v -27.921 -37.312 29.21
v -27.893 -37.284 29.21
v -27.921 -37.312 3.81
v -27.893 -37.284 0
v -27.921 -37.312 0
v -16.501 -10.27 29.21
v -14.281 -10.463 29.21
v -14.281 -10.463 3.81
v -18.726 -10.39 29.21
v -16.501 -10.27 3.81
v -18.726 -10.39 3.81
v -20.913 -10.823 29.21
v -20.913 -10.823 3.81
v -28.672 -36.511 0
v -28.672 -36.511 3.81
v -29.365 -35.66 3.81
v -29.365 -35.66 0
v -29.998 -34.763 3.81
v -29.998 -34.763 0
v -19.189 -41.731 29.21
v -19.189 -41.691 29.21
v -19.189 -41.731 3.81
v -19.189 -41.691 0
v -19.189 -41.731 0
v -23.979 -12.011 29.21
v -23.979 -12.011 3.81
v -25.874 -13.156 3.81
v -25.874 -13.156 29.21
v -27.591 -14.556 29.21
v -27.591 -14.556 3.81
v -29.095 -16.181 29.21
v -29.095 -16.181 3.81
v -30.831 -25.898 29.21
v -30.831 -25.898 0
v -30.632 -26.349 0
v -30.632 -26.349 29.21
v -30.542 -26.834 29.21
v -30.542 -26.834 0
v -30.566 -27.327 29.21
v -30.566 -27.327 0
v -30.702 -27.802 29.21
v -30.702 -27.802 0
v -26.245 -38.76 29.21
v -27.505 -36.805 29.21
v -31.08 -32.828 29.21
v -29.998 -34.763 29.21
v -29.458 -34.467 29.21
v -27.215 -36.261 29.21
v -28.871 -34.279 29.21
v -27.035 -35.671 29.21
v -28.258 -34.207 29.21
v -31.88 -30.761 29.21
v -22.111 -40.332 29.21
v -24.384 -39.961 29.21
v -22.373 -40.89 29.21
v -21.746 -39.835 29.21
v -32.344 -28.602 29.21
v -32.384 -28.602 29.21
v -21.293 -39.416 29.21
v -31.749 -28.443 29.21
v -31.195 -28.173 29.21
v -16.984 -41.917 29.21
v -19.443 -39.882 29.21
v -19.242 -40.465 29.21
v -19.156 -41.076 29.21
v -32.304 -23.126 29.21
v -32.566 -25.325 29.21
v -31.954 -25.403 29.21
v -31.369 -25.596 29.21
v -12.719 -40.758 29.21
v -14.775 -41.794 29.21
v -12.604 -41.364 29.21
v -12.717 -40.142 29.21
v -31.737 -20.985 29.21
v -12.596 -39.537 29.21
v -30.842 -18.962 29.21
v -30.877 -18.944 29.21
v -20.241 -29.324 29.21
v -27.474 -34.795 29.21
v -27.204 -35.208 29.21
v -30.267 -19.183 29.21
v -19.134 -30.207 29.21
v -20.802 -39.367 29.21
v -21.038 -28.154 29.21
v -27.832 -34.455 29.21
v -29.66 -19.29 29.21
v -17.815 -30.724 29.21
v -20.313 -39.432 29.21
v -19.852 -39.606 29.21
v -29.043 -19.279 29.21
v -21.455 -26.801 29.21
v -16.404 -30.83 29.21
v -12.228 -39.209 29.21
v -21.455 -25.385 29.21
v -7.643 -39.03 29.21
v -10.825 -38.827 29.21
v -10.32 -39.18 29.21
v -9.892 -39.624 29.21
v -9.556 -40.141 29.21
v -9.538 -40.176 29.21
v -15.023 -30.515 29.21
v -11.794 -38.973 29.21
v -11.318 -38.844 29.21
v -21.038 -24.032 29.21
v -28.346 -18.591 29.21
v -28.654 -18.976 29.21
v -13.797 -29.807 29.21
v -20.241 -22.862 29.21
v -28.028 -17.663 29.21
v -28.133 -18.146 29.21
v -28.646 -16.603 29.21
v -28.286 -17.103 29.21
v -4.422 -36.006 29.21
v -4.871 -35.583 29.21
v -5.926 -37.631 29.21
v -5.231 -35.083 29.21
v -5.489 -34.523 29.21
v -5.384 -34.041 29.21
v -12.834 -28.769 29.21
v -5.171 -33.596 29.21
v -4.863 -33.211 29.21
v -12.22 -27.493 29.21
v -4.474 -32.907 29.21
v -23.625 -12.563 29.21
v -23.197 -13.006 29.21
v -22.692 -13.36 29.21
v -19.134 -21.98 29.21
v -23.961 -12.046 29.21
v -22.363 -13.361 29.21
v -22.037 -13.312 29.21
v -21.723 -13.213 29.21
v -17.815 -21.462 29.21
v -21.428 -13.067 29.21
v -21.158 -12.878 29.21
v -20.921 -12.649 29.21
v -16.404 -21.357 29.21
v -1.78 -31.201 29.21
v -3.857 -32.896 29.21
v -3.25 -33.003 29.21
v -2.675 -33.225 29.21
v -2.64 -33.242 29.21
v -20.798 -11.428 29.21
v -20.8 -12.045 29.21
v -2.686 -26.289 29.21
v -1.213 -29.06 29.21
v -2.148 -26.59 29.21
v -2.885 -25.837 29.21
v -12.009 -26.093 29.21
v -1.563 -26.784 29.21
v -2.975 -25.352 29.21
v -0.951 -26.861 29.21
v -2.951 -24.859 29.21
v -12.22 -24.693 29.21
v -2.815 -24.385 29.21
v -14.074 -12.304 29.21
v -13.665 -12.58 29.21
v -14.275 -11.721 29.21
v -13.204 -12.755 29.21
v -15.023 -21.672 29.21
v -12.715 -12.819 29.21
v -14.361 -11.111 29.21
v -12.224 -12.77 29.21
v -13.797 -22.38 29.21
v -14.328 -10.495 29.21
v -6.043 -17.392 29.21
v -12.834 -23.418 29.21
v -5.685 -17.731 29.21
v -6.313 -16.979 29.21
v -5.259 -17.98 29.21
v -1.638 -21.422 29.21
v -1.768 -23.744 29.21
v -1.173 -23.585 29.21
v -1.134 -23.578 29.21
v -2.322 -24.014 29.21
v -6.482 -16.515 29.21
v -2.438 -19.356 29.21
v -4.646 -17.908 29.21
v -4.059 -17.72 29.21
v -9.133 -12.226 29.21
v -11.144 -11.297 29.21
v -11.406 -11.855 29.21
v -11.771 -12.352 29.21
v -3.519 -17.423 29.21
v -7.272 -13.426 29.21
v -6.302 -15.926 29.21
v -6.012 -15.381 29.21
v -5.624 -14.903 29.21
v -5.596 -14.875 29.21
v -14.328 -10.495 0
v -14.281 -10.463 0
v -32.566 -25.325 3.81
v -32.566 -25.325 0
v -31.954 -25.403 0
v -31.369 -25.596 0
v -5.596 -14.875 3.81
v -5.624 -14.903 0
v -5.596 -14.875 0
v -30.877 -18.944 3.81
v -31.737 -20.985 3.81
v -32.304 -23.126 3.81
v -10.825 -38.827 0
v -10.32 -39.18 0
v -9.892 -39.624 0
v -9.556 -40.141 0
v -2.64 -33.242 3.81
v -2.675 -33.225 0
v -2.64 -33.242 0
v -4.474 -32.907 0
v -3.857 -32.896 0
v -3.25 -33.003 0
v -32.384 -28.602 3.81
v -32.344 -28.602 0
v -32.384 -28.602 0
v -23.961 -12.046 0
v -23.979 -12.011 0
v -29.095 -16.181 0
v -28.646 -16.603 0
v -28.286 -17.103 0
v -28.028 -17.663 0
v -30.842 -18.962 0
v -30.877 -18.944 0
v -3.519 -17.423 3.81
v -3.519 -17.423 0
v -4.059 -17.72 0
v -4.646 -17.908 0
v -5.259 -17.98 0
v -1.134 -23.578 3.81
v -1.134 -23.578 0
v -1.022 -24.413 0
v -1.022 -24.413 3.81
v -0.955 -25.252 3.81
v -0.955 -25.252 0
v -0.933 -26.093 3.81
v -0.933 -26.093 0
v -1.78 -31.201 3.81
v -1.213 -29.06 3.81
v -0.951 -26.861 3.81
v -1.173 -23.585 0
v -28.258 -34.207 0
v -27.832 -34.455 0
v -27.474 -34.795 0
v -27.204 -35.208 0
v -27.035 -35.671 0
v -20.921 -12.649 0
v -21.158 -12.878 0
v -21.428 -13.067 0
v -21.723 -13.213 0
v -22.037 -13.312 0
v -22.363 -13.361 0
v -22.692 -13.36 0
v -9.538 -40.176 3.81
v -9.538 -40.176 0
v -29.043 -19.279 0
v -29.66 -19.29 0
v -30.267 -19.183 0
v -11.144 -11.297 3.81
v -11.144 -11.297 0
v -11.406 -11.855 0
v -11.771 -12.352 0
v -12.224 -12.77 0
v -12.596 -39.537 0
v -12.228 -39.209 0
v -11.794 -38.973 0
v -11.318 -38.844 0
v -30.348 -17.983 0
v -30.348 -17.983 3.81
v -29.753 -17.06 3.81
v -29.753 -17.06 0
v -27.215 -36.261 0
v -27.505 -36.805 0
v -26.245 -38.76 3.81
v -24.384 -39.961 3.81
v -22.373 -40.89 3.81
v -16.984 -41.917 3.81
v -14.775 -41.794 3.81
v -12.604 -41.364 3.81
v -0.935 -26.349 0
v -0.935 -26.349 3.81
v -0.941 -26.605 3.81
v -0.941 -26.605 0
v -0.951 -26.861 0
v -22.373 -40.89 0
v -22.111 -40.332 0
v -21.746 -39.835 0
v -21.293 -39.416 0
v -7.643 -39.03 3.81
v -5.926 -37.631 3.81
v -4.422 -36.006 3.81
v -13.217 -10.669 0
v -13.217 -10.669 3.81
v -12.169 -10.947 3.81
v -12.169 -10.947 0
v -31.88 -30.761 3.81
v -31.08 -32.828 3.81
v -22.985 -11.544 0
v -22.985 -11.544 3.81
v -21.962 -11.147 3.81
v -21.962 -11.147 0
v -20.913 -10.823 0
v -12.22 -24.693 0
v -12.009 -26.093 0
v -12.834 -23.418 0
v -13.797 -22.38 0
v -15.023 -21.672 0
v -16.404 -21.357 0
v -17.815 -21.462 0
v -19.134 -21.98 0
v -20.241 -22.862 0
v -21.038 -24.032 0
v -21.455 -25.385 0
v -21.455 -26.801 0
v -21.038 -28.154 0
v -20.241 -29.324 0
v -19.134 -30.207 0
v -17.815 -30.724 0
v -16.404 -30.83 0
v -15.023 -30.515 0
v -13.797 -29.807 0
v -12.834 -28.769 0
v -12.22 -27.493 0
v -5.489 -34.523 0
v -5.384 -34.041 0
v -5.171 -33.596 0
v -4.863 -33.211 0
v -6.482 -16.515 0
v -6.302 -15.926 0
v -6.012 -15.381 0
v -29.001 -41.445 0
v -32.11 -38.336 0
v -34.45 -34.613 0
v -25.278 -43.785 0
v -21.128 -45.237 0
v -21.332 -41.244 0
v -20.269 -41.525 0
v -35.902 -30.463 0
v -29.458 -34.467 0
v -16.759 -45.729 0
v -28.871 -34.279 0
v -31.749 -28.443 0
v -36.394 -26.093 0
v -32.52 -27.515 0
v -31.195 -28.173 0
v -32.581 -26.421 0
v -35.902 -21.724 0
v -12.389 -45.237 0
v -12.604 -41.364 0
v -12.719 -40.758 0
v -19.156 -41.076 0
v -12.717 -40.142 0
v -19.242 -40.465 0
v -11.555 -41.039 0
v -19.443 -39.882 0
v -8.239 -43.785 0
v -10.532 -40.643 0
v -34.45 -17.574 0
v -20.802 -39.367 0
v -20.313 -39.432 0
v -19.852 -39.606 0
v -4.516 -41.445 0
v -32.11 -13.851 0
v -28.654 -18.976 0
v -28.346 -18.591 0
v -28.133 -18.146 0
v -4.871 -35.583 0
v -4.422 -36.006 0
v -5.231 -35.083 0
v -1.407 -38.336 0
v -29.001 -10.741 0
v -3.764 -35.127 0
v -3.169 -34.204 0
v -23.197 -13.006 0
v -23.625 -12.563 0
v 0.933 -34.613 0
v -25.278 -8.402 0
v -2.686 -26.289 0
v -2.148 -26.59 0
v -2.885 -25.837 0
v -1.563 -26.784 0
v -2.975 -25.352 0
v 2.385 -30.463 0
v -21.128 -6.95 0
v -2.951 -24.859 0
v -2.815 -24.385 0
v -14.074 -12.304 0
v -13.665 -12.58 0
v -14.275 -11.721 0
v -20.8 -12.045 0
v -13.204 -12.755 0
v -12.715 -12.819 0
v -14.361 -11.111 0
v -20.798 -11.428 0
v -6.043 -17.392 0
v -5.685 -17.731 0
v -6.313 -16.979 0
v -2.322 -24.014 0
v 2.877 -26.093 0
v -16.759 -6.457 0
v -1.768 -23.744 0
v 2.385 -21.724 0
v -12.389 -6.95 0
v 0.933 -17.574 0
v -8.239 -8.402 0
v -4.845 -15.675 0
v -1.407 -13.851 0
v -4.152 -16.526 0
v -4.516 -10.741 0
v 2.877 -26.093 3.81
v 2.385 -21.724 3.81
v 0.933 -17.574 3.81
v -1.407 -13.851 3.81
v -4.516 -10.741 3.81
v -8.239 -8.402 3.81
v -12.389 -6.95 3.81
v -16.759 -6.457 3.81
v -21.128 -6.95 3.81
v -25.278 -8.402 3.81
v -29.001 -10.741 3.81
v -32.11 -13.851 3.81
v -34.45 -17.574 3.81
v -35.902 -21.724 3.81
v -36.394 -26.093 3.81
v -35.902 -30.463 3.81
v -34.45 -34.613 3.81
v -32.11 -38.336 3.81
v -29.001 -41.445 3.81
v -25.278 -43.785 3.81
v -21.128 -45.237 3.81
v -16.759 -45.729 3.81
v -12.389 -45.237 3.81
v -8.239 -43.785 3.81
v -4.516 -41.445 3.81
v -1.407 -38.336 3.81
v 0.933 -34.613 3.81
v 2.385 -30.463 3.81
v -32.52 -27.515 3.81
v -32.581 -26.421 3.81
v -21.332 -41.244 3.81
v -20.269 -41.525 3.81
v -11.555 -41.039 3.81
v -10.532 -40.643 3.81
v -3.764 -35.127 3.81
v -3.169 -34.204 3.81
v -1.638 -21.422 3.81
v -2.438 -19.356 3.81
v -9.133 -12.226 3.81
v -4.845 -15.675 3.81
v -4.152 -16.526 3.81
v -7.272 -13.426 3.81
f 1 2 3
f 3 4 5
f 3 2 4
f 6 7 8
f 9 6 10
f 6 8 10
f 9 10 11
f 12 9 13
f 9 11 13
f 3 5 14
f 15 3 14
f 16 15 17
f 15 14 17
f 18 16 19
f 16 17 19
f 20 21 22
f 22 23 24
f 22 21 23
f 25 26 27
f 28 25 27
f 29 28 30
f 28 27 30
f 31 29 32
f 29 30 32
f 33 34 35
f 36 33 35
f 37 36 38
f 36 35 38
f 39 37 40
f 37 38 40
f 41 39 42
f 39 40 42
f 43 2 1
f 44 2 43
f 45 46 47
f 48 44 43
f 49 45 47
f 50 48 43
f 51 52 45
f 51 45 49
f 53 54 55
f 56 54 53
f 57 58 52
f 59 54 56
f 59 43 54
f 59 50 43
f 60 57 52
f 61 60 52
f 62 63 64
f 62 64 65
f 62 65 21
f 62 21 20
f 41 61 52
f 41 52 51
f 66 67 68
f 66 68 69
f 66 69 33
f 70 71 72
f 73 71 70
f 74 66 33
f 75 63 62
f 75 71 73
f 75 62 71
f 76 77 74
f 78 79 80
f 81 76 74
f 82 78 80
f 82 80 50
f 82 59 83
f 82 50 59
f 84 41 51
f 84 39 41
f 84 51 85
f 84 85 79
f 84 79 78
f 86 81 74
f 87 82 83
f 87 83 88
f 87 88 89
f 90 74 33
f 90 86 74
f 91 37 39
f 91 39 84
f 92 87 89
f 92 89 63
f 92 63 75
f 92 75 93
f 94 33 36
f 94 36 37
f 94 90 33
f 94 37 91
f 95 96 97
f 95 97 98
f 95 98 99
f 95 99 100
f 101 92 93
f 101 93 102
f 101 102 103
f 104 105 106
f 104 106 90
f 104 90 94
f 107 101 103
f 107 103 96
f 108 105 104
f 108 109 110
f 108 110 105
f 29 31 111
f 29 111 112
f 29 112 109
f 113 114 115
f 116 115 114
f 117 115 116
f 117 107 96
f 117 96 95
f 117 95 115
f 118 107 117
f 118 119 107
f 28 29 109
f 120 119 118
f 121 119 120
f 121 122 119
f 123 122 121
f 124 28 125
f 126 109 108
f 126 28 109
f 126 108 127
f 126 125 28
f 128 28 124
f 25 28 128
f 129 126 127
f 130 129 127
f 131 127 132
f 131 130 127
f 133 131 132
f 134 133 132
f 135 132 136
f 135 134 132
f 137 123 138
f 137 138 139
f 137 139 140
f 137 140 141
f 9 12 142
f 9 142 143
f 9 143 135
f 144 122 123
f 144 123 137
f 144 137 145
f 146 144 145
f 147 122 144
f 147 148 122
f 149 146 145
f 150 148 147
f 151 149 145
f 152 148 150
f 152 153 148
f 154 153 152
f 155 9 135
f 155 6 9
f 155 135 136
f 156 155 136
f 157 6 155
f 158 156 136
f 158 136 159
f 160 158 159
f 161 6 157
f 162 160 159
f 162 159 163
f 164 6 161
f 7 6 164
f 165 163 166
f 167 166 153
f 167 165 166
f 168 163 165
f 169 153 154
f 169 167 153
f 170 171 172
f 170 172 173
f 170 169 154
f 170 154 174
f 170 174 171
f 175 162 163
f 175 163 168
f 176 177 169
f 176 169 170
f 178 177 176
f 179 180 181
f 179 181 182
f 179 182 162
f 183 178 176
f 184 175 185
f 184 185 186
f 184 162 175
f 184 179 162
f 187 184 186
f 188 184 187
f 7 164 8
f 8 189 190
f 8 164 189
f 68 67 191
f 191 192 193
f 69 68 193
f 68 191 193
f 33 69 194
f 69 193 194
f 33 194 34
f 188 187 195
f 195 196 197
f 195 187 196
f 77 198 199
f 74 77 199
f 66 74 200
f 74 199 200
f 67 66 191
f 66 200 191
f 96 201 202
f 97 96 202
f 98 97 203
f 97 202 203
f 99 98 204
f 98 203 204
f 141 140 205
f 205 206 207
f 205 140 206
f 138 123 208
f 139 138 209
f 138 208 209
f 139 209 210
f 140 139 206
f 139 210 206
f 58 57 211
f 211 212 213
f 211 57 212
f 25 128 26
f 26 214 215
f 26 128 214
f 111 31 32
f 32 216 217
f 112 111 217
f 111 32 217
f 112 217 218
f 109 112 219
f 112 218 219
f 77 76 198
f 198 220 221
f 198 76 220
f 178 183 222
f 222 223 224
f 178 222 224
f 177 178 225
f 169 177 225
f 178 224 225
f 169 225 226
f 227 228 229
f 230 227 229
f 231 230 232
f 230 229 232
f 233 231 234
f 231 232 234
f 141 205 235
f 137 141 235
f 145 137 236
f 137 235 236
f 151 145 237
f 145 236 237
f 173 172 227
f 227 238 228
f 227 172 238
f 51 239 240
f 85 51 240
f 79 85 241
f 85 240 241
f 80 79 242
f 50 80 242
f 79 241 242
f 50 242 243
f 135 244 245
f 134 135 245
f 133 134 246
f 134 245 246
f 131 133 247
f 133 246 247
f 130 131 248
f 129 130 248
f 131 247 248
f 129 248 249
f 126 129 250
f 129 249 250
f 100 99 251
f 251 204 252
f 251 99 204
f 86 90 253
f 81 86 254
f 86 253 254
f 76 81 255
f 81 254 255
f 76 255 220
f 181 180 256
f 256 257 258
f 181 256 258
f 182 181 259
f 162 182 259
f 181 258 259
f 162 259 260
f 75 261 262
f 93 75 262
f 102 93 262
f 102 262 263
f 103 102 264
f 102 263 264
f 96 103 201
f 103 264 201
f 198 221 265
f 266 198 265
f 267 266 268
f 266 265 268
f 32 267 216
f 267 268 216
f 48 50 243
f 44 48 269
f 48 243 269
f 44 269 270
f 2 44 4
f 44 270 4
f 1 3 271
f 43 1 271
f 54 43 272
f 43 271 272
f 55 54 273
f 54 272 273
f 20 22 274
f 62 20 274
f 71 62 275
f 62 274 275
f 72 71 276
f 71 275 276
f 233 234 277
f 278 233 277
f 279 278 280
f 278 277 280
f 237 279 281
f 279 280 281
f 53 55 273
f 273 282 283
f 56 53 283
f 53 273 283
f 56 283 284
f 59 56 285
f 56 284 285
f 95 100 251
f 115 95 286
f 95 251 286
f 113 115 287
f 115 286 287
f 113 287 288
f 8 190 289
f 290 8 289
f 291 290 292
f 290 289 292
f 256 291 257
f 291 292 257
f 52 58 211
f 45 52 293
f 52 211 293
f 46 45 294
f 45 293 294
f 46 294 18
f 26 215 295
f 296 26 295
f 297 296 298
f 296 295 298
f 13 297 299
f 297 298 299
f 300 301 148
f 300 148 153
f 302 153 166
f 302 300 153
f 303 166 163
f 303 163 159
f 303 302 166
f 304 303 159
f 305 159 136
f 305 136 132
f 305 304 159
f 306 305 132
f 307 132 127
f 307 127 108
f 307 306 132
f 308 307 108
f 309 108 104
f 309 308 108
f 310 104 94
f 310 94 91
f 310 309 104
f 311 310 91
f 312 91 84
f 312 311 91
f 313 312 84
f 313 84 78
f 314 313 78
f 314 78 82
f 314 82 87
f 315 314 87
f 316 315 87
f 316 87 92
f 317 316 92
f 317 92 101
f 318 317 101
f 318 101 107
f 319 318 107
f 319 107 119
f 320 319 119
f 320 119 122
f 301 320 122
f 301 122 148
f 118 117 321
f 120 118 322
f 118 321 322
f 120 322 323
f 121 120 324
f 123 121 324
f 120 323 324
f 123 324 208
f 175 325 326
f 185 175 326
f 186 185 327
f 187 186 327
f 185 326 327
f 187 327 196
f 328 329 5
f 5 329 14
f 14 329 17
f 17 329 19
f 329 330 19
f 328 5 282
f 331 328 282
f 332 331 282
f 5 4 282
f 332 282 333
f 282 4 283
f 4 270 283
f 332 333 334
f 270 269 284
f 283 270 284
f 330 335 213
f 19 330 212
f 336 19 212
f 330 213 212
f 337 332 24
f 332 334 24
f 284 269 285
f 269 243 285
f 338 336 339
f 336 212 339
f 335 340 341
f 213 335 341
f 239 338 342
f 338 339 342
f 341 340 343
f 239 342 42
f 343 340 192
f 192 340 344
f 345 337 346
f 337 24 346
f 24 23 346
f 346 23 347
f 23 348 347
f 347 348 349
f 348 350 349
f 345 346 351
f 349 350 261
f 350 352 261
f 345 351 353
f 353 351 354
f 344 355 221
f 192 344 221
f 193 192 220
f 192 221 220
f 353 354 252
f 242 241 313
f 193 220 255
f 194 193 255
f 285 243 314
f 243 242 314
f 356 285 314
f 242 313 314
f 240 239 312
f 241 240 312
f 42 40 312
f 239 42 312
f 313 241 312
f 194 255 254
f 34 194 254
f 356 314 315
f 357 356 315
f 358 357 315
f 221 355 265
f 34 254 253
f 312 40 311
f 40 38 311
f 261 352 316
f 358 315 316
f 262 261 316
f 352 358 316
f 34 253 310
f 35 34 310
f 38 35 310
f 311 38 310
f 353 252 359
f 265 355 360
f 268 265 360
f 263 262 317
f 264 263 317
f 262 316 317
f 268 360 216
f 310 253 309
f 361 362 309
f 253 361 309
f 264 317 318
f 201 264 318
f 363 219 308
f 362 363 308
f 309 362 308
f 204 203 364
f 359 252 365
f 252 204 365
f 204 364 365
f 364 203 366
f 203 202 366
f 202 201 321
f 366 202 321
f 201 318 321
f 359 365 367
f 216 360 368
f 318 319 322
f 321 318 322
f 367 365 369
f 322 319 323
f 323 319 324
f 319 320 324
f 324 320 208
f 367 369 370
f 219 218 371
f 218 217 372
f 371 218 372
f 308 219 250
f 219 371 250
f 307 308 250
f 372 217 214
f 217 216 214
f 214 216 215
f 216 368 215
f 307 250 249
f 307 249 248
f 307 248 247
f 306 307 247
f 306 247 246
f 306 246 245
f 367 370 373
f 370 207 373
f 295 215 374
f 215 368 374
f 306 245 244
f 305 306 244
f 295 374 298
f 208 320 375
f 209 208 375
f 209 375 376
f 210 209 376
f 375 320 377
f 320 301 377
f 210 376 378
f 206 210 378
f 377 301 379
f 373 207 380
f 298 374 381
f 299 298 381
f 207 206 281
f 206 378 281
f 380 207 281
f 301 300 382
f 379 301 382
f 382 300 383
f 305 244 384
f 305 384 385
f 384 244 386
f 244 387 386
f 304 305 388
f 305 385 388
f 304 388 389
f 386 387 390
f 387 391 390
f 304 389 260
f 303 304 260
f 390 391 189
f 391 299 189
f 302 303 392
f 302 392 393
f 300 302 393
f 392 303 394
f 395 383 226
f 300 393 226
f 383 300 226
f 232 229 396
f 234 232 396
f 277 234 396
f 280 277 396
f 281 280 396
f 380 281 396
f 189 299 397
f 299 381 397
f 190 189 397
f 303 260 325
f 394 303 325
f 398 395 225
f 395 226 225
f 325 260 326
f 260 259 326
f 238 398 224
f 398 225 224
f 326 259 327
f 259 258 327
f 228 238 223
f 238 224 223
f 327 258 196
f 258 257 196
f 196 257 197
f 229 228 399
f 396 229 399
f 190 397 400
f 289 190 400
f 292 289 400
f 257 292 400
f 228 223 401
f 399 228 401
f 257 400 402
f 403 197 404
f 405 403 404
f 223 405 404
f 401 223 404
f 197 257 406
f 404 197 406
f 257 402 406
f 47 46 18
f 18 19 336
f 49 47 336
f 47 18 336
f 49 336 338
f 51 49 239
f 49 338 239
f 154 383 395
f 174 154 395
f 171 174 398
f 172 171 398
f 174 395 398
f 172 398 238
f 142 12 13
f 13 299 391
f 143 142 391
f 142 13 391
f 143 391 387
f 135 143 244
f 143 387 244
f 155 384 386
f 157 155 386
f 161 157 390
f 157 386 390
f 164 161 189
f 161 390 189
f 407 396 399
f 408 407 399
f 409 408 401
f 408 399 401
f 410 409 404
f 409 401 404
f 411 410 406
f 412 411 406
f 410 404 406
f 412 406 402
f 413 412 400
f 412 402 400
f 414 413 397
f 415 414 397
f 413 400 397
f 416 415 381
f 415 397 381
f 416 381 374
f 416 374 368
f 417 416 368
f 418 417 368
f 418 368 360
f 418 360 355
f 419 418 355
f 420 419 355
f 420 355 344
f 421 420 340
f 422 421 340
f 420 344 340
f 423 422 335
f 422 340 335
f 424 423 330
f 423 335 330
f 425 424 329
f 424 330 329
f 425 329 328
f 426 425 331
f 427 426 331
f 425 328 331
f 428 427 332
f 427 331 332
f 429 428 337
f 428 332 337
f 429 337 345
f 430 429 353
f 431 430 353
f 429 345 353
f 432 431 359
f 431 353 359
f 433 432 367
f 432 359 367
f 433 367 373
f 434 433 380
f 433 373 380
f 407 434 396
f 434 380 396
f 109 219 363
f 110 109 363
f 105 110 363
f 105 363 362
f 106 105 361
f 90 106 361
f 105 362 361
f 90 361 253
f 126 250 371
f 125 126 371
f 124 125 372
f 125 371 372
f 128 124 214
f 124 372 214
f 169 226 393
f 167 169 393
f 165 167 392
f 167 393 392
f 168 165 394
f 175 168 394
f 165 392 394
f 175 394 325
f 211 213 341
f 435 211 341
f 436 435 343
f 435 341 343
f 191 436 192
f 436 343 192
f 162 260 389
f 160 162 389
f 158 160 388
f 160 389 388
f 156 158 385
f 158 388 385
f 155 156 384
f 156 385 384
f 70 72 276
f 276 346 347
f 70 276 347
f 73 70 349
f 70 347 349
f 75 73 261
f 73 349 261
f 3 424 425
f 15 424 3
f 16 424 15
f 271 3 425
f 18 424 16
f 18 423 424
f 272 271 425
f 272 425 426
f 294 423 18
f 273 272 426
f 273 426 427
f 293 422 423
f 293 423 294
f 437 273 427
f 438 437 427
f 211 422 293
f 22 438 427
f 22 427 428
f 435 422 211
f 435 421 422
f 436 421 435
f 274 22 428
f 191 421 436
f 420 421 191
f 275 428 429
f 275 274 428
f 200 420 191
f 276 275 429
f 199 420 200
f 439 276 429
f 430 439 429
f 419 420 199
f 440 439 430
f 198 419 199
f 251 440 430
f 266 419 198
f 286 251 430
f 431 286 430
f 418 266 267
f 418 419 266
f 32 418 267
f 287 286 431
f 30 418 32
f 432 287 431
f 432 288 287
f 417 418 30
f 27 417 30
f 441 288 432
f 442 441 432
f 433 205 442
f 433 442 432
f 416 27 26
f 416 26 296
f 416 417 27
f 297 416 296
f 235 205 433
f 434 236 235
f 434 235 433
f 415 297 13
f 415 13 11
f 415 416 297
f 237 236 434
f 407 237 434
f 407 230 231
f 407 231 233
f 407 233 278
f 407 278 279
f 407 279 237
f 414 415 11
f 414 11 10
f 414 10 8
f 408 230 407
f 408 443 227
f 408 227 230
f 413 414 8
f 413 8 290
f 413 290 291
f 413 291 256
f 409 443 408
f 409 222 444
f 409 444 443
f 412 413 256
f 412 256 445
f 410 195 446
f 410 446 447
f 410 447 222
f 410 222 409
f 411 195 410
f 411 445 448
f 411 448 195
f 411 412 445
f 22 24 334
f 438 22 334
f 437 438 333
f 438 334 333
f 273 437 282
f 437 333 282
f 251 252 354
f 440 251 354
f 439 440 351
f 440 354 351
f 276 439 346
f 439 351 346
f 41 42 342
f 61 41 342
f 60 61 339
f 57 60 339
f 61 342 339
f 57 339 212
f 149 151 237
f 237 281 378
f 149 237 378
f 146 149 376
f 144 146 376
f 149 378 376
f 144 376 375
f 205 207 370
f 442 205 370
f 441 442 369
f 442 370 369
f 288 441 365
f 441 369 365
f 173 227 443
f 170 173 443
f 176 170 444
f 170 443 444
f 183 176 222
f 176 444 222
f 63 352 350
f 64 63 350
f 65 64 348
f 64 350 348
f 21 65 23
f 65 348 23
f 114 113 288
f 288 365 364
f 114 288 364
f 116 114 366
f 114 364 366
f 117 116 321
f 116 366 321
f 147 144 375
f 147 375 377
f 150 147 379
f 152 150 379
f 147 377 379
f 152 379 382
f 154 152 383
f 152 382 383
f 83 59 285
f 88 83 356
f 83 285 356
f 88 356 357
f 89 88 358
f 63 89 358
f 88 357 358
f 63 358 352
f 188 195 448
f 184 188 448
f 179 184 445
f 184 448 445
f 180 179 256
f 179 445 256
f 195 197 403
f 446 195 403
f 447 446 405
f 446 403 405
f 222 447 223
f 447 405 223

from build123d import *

# Parameters (mm, degrees)
F0_R     = 19.635790459
F0_R_2   = 12.015790459
F0_R_3   = 4.75
F1_DEPTH = 3.81
F2_DEPTH = 29.21


with BuildPart() as f1:
    # F0 (on Top) → F1 (new body)
    with BuildSketch(Plane.XY):
        with Locations((-16.7585039379, -26.0932887787)):
            Circle(F0_R)
        with BuildLine():
            ThreePointArc((-29.0954614281, -16.180916533), (-26.7569848864, -13.826014331), (-23.9788151651, -12.0105777671))
            ThreePointArc((-23.9788151651, -12.0105777671), (-22.476828118, -11.336716947), (-20.9129659851, -10.8225295065))
            ThreePointArc((-20.9129659851, -10.8225295065), (-17.6158542996, -10.2907385412), (-14.2805615256, -10.4626955381))
            ThreePointArc((-14.2805615256, -10.4626955381), (-12.6906360083, -10.7992345693), (-11.1436072451, -11.2970534879))
            ThreePointArc((-11.1436072451, -11.2970534879), (-8.1813331682, -12.7933720406), (-5.5962487371, -14.874567707))
            ThreePointArc((-5.5962487371, -14.874567707), (-4.4912294901, -16.0948078302), (-3.5189481983, -17.4232364448))
            ThreePointArc((-3.5189481983, -17.4232364448), (-2.0019321061, -20.3749645986), (-1.1338509893, -23.5781617659))
            ThreePointArc((-1.1338509893, -23.5781617659), (-0.9830779973, -24.8317103835), (-0.9327134788, -26.0932887787))
            ThreePointArc((-0.9327134788, -26.0932887787), (-0.9373731571, -26.4772998105), (-0.9513494481, -26.8610847091))
            ThreePointArc((-0.9513494481, -26.8610847091), (-1.4590399264, -30.1407626347), (-2.6395396055, -33.2424488576))
            ThreePointArc((-2.6395396055, -33.2424488576), (-3.4585871997, -34.6704595484), (-4.4215464476, -36.0056610244))
            ThreePointArc((-4.4215464476, -36.0056610244), (-6.7600229894, -38.3605632264), (-9.5381927107, -40.1759997903))
            ThreePointArc((-9.5381927107, -40.1759997903), (-11.0401797578, -40.8498606104), (-12.6040418906, -41.364048051))
            ThreePointArc((-12.6040418906, -41.364048051), (-15.8771225924, -41.8945169138), (-19.1888940058, -41.7313464513))
            ThreePointArc((-19.1888940058, -41.7313464513), (-20.8031084916, -41.3935115763), (-22.3734006307, -40.8895240696))
            ThreePointArc((-22.3734006307, -40.8895240696), (-25.3356747075, -39.3932055169), (-27.9207591387, -37.3120098505))
            ThreePointArc((-27.9207591387, -37.3120098505), (-29.0257783856, -36.0917697272), (-29.9980596774, -34.7633411126))
            ThreePointArc((-29.9980596774, -34.7633411126), (-31.5162594242, -31.8085575091), (-32.3841970537, -28.6019454517))
            ThreePointArc((-32.3841970537, -28.6019454517), (-32.5600786241, -26.968435103), (-32.5656584276, -25.3254928483))
            ThreePointArc((-32.5656584276, -25.3254928483), (-32.0579679493, -22.0458149227), (-30.8774682703, -18.9441286998))
            ThreePointArc((-30.8774682703, -18.9441286998), (-30.058420676, -17.516118009), (-29.0954614281, -16.180916533))
        make_face(mode=Mode.SUBTRACT)
        with BuildLine():
            ThreePointArc((-22.6921084548, -13.3599276036), (-23.4218873645, -12.7949300931), (-23.9606425579, -12.0455688415))
            Line((-23.9606425579, -12.0455688415), (-23.9788151651, -12.0105777671))
            ThreePointArc((-23.9788151651, -12.0105777671), (-26.7569848864, -13.826014331), (-29.0954614281, -16.180916533))
            ThreePointArc((-29.0954614281, -16.180916533), (-28.4541428865, -16.8446257856), (-28.0282875658, -17.6634338766))
            ThreePointArc((-28.0282875658, -17.6634338766), (-28.345540736, -18.5909782757), (-29.0433727408, -19.2794684205))
            ThreePointArc((-29.0433727408, -19.2794684205), (-29.9658734851, -19.2513291133), (-30.8421990848, -18.9617554831))
            Line((-30.8421990848, -18.9617554831), (-30.8774682703, -18.9441286998))
            ThreePointArc((-30.8774682703, -18.9441286998), (-32.0579679493, -22.0458149227), (-32.5656584276, -25.3254928483))
            ThreePointArc((-32.5656584276, -25.3254928483), (-31.6567023181, -25.4854873322), (-30.8308948063, -25.8976055158))
            ThreePointArc((-30.8308948063, -25.8976055158), (-30.5423610938, -26.8344814324), (-30.7022346915, -27.801657021))
            ThreePointArc((-30.7022346915, -27.801657021), (-31.4650933407, -28.321124176), (-32.3442627527, -28.6019454517))
            Line((-32.3442627527, -28.6019454517), (-32.3841970537, -28.6019454517))
            ThreePointArc((-32.3841970537, -28.6019454517), (-31.5162594242, -31.8085575091), (-29.9980596774, -34.7633411126))
            ThreePointArc((-29.9980596774, -34.7633411126), (-29.1686563396, -34.3585083729), (-28.2583270379, -34.2065215104))
            ThreePointArc((-28.2583270379, -34.2065215104), (-27.4742165141, -34.7948741876), (-27.0350654242, -35.6713070183))
            ThreePointArc((-27.0350654242, -35.6713070183), (-27.346895903, -36.5399618383), (-27.8930962938, -37.2839138374))
            Line((-27.8930962938, -37.2839138374), (-27.9207591387, -37.3120098505))
            ThreePointArc((-27.9207591387, -37.3120098505), (-25.3356747075, -39.3932055169), (-22.3734006307, -40.8895240696))
            ThreePointArc((-22.3734006307, -40.8895240696), (-21.9403539493, -40.0744964531), (-21.29321771, -39.4164583602))
            ThreePointArc((-21.29321771, -39.4164583602), (-20.3130339439, -39.4315570726), (-19.4425989567, -39.8824795929))
            ThreePointArc((-19.4425989567, -39.8824795929), (-19.1842926208, -40.7685254612), (-19.1888940058, -41.691443806))
            Line((-19.1888940058, -41.691443806), (-19.1888940058, -41.7313464513))
            ThreePointArc((-19.1888940058, -41.7313464513), (-15.8771225924, -41.8945169138), (-12.6040418906, -41.364048051))
            ThreePointArc((-12.6040418906, -41.364048051), (-12.7327609791, -40.4501384055), (-12.5960018504, -39.5373972677))
            ThreePointArc((-12.5960018504, -39.5373972677), (-11.7941417255, -38.9734748204), (-10.824899421, -38.8266499539))
            ThreePointArc((-10.824899421, -38.8266499539), (-10.0951205112, -39.3916474643), (-9.5563653178, -40.1410087159))
            Line((-9.5563653178, -40.1410087159), (-9.5381927107, -40.1759997903))
            ThreePointArc((-9.5381927107, -40.1759997903), (-6.7600229894, -38.3605632264), (-4.4215464476, -36.0056610244))
            ThreePointArc((-4.4215464476, -36.0056610244), (-5.0628649893, -35.3419517718), (-5.4887203099, -34.5231436809))
            ThreePointArc((-5.4887203099, -34.5231436809), (-5.1714671398, -33.5955992817), (-4.4736351349, -32.907109137))
            ThreePointArc((-4.4736351349, -32.907109137), (-3.5511343906, -32.9352484441), (-2.674808791, -33.2248220743))
            Line((-2.674808791, -33.2248220743), (-2.6395396055, -33.2424488576))
            ThreePointArc((-2.6395396055, -33.2424488576), (-1.4590399264, -30.1407626347), (-0.9513494481, -26.8610847091))
            ThreePointArc((-0.9513494481, -26.8610847091), (-1.8603055576, -26.7010902252), (-2.6861130695, -26.2889720416))
            ThreePointArc((-2.6861130695, -26.2889720416), (-2.974646782, -25.352096125), (-2.8147731843, -24.3849205364))
            ThreePointArc((-2.8147731843, -24.3849205364), (-2.051914535, -23.8654533814), (-1.172745123, -23.5846321057))
            Line((-1.172745123, -23.5846321057), (-1.1338509893, -23.5781617659))
            ThreePointArc((-1.1338509893, -23.5781617659), (-2.0019321061, -20.3749645986), (-3.5189481983, -17.4232364448))
            ThreePointArc((-3.5189481983, -17.4232364448), (-4.3483515361, -17.8280691845), (-5.2586808378, -17.980056047))
            ThreePointArc((-5.2586808378, -17.980056047), (-6.0427913617, -17.3917033698), (-6.4819424515, -16.5152705392))
            ThreePointArc((-6.4819424515, -16.5152705392), (-6.1701119728, -15.6466157191), (-5.6239115819, -14.90266372))
            Line((-5.6239115819, -14.90266372), (-5.5962487371, -14.874567707))
            ThreePointArc((-5.5962487371, -14.874567707), (-8.1813331682, -12.7933720406), (-11.1436072451, -11.2970534879))
            ThreePointArc((-11.1436072451, -11.2970534879), (-11.5766539265, -12.1120811043), (-12.2237901657, -12.7701191972))
            ThreePointArc((-12.2237901657, -12.7701191972), (-13.2039739318, -12.7550204848), (-14.0744089191, -12.3040979645))
            ThreePointArc((-14.0744089191, -12.3040979645), (-14.332715255, -11.4180520962), (-14.3281138699, -10.4951337515))
            Line((-14.3281138699, -10.4951337515), (-14.2805615256, -10.4626955381))
            ThreePointArc((-14.2805615256, -10.4626955381), (-17.6158542996, -10.2907385412), (-20.9129659851, -10.8225295065))
            ThreePointArc((-20.9129659851, -10.8225295065), (-20.7842468966, -11.736439152), (-20.9210060254, -12.6491802897))
            ThreePointArc((-20.9210060254, -12.6491802897), (-21.2891829215, -12.9777143323), (-21.7228661502, -13.213102737))
            ThreePointArc((-21.7228661502, -13.213102737), (-22.1989595709, -13.3428097096), (-22.6921084548, -13.3599276036))
        make_face()
        with Locations((-16.7585039379, -26.0932887787)):
            Circle(F0_R_2, mode=Mode.SUBTRACT)
        with Locations((-16.7585039379, -26.0932887787)):
            Circle(F0_R_2)
        with Locations((-16.7585039379, -26.0932887787)):
            Circle(F0_R_3, mode=Mode.SUBTRACT)
    extrude(amount=F1_DEPTH)

    # F0 (on Top) → F2 (join)
    with BuildSketch(Plane.XY):
        with BuildLine():
            ThreePointArc((-22.6921084548, -13.3599276036), (-23.4218873645, -12.7949300931), (-23.9606425579, -12.0455688415))
            Line((-23.9606425579, -12.0455688415), (-23.9788151651, -12.0105777671))
            ThreePointArc((-23.9788151651, -12.0105777671), (-26.7569848864, -13.826014331), (-29.0954614281, -16.180916533))
            ThreePointArc((-29.0954614281, -16.180916533), (-28.4541428865, -16.8446257856), (-28.0282875658, -17.6634338766))
            ThreePointArc((-28.0282875658, -17.6634338766), (-28.345540736, -18.5909782757), (-29.0433727408, -19.2794684205))
            ThreePointArc((-29.0433727408, -19.2794684205), (-29.9658734851, -19.2513291133), (-30.8421990848, -18.9617554831))
            Line((-30.8421990848, -18.9617554831), (-30.8774682703, -18.9441286998))
            ThreePointArc((-30.8774682703, -18.9441286998), (-32.0579679493, -22.0458149227), (-32.5656584276, -25.3254928483))
            ThreePointArc((-32.5656584276, -25.3254928483), (-31.6567023181, -25.4854873322), (-30.8308948063, -25.8976055158))
            ThreePointArc((-30.8308948063, -25.8976055158), (-30.5423610938, -26.8344814324), (-30.7022346915, -27.801657021))
            ThreePointArc((-30.7022346915, -27.801657021), (-31.4650933407, -28.321124176), (-32.3442627527, -28.6019454517))
            Line((-32.3442627527, -28.6019454517), (-32.3841970537, -28.6019454517))
            ThreePointArc((-32.3841970537, -28.6019454517), (-31.5162594242, -31.8085575091), (-29.9980596774, -34.7633411126))
            ThreePointArc((-29.9980596774, -34.7633411126), (-29.1686563396, -34.3585083729), (-28.2583270379, -34.2065215104))
            ThreePointArc((-28.2583270379, -34.2065215104), (-27.4742165141, -34.7948741876), (-27.0350654242, -35.6713070183))
            ThreePointArc((-27.0350654242, -35.6713070183), (-27.346895903, -36.5399618383), (-27.8930962938, -37.2839138374))
            Line((-27.8930962938, -37.2839138374), (-27.9207591387, -37.3120098505))
            ThreePointArc((-27.9207591387, -37.3120098505), (-25.3356747075, -39.3932055169), (-22.3734006307, -40.8895240696))
            ThreePointArc((-22.3734006307, -40.8895240696), (-21.9403539493, -40.0744964531), (-21.29321771, -39.4164583602))
            ThreePointArc((-21.29321771, -39.4164583602), (-20.3130339439, -39.4315570726), (-19.4425989567, -39.8824795929))
            ThreePointArc((-19.4425989567, -39.8824795929), (-19.1842926208, -40.7685254612), (-19.1888940058, -41.691443806))
            Line((-19.1888940058, -41.691443806), (-19.1888940058, -41.7313464513))
            ThreePointArc((-19.1888940058, -41.7313464513), (-15.8771225924, -41.8945169138), (-12.6040418906, -41.364048051))
            ThreePointArc((-12.6040418906, -41.364048051), (-12.7327609791, -40.4501384055), (-12.5960018504, -39.5373972677))
            ThreePointArc((-12.5960018504, -39.5373972677), (-11.7941417255, -38.9734748204), (-10.824899421, -38.8266499539))
            ThreePointArc((-10.824899421, -38.8266499539), (-10.0951205112, -39.3916474643), (-9.5563653178, -40.1410087159))
            Line((-9.5563653178, -40.1410087159), (-9.5381927107, -40.1759997903))
            ThreePointArc((-9.5381927107, -40.1759997903), (-6.7600229894, -38.3605632264), (-4.4215464476, -36.0056610244))
            ThreePointArc((-4.4215464476, -36.0056610244), (-5.0628649893, -35.3419517718), (-5.4887203099, -34.5231436809))
            ThreePointArc((-5.4887203099, -34.5231436809), (-5.1714671398, -33.5955992817), (-4.4736351349, -32.907109137))
            ThreePointArc((-4.4736351349, -32.907109137), (-3.5511343906, -32.9352484441), (-2.674808791, -33.2248220743))
            Line((-2.674808791, -33.2248220743), (-2.6395396055, -33.2424488576))
            ThreePointArc((-2.6395396055, -33.2424488576), (-1.4590399264, -30.1407626347), (-0.9513494481, -26.8610847091))
            ThreePointArc((-0.9513494481, -26.8610847091), (-1.8603055576, -26.7010902252), (-2.6861130695, -26.2889720416))
            ThreePointArc((-2.6861130695, -26.2889720416), (-2.974646782, -25.352096125), (-2.8147731843, -24.3849205364))
            ThreePointArc((-2.8147731843, -24.3849205364), (-2.051914535, -23.8654533814), (-1.172745123, -23.5846321057))
            Line((-1.172745123, -23.5846321057), (-1.1338509893, -23.5781617659))
            ThreePointArc((-1.1338509893, -23.5781617659), (-2.0019321061, -20.3749645986), (-3.5189481983, -17.4232364448))
            ThreePointArc((-3.5189481983, -17.4232364448), (-4.3483515361, -17.8280691845), (-5.2586808378, -17.980056047))
            ThreePointArc((-5.2586808378, -17.980056047), (-6.0427913617, -17.3917033698), (-6.4819424515, -16.5152705392))
            ThreePointArc((-6.4819424515, -16.5152705392), (-6.1701119728, -15.6466157191), (-5.6239115819, -14.90266372))
            Line((-5.6239115819, -14.90266372), (-5.5962487371, -14.874567707))
            ThreePointArc((-5.5962487371, -14.874567707), (-8.1813331682, -12.7933720406), (-11.1436072451, -11.2970534879))
            ThreePointArc((-11.1436072451, -11.2970534879), (-11.5766539265, -12.1120811043), (-12.2237901657, -12.7701191972))
            ThreePointArc((-12.2237901657, -12.7701191972), (-13.2039739318, -12.7550204848), (-14.0744089191, -12.3040979645))
            ThreePointArc((-14.0744089191, -12.3040979645), (-14.332715255, -11.4180520962), (-14.3281138699, -10.4951337515))
            Line((-14.3281138699, -10.4951337515), (-14.2805615256, -10.4626955381))
            ThreePointArc((-14.2805615256, -10.4626955381), (-17.6158542996, -10.2907385412), (-20.9129659851, -10.8225295065))
            ThreePointArc((-20.9129659851, -10.8225295065), (-20.7842468966, -11.736439152), (-20.9210060254, -12.6491802897))
            ThreePointArc((-20.9210060254, -12.6491802897), (-21.2891829215, -12.9777143323), (-21.7228661502, -13.213102737))
            ThreePointArc((-21.7228661502, -13.213102737), (-22.1989595709, -13.3428097096), (-22.6921084548, -13.3599276036))
        make_face()
        with Locations((-16.7585039379, -26.0932887787)):
            Circle(F0_R_2, mode=Mode.SUBTRACT)
        with Locations((-16.7585039379, -26.0932887787)):
            Circle(F0_R_2)
        with Locations((-16.7585039379, -26.0932887787)):
            Circle(F0_R_3, mode=Mode.SUBTRACT)
    extrude(amount=F2_DEPTH)


solid = f1.part
